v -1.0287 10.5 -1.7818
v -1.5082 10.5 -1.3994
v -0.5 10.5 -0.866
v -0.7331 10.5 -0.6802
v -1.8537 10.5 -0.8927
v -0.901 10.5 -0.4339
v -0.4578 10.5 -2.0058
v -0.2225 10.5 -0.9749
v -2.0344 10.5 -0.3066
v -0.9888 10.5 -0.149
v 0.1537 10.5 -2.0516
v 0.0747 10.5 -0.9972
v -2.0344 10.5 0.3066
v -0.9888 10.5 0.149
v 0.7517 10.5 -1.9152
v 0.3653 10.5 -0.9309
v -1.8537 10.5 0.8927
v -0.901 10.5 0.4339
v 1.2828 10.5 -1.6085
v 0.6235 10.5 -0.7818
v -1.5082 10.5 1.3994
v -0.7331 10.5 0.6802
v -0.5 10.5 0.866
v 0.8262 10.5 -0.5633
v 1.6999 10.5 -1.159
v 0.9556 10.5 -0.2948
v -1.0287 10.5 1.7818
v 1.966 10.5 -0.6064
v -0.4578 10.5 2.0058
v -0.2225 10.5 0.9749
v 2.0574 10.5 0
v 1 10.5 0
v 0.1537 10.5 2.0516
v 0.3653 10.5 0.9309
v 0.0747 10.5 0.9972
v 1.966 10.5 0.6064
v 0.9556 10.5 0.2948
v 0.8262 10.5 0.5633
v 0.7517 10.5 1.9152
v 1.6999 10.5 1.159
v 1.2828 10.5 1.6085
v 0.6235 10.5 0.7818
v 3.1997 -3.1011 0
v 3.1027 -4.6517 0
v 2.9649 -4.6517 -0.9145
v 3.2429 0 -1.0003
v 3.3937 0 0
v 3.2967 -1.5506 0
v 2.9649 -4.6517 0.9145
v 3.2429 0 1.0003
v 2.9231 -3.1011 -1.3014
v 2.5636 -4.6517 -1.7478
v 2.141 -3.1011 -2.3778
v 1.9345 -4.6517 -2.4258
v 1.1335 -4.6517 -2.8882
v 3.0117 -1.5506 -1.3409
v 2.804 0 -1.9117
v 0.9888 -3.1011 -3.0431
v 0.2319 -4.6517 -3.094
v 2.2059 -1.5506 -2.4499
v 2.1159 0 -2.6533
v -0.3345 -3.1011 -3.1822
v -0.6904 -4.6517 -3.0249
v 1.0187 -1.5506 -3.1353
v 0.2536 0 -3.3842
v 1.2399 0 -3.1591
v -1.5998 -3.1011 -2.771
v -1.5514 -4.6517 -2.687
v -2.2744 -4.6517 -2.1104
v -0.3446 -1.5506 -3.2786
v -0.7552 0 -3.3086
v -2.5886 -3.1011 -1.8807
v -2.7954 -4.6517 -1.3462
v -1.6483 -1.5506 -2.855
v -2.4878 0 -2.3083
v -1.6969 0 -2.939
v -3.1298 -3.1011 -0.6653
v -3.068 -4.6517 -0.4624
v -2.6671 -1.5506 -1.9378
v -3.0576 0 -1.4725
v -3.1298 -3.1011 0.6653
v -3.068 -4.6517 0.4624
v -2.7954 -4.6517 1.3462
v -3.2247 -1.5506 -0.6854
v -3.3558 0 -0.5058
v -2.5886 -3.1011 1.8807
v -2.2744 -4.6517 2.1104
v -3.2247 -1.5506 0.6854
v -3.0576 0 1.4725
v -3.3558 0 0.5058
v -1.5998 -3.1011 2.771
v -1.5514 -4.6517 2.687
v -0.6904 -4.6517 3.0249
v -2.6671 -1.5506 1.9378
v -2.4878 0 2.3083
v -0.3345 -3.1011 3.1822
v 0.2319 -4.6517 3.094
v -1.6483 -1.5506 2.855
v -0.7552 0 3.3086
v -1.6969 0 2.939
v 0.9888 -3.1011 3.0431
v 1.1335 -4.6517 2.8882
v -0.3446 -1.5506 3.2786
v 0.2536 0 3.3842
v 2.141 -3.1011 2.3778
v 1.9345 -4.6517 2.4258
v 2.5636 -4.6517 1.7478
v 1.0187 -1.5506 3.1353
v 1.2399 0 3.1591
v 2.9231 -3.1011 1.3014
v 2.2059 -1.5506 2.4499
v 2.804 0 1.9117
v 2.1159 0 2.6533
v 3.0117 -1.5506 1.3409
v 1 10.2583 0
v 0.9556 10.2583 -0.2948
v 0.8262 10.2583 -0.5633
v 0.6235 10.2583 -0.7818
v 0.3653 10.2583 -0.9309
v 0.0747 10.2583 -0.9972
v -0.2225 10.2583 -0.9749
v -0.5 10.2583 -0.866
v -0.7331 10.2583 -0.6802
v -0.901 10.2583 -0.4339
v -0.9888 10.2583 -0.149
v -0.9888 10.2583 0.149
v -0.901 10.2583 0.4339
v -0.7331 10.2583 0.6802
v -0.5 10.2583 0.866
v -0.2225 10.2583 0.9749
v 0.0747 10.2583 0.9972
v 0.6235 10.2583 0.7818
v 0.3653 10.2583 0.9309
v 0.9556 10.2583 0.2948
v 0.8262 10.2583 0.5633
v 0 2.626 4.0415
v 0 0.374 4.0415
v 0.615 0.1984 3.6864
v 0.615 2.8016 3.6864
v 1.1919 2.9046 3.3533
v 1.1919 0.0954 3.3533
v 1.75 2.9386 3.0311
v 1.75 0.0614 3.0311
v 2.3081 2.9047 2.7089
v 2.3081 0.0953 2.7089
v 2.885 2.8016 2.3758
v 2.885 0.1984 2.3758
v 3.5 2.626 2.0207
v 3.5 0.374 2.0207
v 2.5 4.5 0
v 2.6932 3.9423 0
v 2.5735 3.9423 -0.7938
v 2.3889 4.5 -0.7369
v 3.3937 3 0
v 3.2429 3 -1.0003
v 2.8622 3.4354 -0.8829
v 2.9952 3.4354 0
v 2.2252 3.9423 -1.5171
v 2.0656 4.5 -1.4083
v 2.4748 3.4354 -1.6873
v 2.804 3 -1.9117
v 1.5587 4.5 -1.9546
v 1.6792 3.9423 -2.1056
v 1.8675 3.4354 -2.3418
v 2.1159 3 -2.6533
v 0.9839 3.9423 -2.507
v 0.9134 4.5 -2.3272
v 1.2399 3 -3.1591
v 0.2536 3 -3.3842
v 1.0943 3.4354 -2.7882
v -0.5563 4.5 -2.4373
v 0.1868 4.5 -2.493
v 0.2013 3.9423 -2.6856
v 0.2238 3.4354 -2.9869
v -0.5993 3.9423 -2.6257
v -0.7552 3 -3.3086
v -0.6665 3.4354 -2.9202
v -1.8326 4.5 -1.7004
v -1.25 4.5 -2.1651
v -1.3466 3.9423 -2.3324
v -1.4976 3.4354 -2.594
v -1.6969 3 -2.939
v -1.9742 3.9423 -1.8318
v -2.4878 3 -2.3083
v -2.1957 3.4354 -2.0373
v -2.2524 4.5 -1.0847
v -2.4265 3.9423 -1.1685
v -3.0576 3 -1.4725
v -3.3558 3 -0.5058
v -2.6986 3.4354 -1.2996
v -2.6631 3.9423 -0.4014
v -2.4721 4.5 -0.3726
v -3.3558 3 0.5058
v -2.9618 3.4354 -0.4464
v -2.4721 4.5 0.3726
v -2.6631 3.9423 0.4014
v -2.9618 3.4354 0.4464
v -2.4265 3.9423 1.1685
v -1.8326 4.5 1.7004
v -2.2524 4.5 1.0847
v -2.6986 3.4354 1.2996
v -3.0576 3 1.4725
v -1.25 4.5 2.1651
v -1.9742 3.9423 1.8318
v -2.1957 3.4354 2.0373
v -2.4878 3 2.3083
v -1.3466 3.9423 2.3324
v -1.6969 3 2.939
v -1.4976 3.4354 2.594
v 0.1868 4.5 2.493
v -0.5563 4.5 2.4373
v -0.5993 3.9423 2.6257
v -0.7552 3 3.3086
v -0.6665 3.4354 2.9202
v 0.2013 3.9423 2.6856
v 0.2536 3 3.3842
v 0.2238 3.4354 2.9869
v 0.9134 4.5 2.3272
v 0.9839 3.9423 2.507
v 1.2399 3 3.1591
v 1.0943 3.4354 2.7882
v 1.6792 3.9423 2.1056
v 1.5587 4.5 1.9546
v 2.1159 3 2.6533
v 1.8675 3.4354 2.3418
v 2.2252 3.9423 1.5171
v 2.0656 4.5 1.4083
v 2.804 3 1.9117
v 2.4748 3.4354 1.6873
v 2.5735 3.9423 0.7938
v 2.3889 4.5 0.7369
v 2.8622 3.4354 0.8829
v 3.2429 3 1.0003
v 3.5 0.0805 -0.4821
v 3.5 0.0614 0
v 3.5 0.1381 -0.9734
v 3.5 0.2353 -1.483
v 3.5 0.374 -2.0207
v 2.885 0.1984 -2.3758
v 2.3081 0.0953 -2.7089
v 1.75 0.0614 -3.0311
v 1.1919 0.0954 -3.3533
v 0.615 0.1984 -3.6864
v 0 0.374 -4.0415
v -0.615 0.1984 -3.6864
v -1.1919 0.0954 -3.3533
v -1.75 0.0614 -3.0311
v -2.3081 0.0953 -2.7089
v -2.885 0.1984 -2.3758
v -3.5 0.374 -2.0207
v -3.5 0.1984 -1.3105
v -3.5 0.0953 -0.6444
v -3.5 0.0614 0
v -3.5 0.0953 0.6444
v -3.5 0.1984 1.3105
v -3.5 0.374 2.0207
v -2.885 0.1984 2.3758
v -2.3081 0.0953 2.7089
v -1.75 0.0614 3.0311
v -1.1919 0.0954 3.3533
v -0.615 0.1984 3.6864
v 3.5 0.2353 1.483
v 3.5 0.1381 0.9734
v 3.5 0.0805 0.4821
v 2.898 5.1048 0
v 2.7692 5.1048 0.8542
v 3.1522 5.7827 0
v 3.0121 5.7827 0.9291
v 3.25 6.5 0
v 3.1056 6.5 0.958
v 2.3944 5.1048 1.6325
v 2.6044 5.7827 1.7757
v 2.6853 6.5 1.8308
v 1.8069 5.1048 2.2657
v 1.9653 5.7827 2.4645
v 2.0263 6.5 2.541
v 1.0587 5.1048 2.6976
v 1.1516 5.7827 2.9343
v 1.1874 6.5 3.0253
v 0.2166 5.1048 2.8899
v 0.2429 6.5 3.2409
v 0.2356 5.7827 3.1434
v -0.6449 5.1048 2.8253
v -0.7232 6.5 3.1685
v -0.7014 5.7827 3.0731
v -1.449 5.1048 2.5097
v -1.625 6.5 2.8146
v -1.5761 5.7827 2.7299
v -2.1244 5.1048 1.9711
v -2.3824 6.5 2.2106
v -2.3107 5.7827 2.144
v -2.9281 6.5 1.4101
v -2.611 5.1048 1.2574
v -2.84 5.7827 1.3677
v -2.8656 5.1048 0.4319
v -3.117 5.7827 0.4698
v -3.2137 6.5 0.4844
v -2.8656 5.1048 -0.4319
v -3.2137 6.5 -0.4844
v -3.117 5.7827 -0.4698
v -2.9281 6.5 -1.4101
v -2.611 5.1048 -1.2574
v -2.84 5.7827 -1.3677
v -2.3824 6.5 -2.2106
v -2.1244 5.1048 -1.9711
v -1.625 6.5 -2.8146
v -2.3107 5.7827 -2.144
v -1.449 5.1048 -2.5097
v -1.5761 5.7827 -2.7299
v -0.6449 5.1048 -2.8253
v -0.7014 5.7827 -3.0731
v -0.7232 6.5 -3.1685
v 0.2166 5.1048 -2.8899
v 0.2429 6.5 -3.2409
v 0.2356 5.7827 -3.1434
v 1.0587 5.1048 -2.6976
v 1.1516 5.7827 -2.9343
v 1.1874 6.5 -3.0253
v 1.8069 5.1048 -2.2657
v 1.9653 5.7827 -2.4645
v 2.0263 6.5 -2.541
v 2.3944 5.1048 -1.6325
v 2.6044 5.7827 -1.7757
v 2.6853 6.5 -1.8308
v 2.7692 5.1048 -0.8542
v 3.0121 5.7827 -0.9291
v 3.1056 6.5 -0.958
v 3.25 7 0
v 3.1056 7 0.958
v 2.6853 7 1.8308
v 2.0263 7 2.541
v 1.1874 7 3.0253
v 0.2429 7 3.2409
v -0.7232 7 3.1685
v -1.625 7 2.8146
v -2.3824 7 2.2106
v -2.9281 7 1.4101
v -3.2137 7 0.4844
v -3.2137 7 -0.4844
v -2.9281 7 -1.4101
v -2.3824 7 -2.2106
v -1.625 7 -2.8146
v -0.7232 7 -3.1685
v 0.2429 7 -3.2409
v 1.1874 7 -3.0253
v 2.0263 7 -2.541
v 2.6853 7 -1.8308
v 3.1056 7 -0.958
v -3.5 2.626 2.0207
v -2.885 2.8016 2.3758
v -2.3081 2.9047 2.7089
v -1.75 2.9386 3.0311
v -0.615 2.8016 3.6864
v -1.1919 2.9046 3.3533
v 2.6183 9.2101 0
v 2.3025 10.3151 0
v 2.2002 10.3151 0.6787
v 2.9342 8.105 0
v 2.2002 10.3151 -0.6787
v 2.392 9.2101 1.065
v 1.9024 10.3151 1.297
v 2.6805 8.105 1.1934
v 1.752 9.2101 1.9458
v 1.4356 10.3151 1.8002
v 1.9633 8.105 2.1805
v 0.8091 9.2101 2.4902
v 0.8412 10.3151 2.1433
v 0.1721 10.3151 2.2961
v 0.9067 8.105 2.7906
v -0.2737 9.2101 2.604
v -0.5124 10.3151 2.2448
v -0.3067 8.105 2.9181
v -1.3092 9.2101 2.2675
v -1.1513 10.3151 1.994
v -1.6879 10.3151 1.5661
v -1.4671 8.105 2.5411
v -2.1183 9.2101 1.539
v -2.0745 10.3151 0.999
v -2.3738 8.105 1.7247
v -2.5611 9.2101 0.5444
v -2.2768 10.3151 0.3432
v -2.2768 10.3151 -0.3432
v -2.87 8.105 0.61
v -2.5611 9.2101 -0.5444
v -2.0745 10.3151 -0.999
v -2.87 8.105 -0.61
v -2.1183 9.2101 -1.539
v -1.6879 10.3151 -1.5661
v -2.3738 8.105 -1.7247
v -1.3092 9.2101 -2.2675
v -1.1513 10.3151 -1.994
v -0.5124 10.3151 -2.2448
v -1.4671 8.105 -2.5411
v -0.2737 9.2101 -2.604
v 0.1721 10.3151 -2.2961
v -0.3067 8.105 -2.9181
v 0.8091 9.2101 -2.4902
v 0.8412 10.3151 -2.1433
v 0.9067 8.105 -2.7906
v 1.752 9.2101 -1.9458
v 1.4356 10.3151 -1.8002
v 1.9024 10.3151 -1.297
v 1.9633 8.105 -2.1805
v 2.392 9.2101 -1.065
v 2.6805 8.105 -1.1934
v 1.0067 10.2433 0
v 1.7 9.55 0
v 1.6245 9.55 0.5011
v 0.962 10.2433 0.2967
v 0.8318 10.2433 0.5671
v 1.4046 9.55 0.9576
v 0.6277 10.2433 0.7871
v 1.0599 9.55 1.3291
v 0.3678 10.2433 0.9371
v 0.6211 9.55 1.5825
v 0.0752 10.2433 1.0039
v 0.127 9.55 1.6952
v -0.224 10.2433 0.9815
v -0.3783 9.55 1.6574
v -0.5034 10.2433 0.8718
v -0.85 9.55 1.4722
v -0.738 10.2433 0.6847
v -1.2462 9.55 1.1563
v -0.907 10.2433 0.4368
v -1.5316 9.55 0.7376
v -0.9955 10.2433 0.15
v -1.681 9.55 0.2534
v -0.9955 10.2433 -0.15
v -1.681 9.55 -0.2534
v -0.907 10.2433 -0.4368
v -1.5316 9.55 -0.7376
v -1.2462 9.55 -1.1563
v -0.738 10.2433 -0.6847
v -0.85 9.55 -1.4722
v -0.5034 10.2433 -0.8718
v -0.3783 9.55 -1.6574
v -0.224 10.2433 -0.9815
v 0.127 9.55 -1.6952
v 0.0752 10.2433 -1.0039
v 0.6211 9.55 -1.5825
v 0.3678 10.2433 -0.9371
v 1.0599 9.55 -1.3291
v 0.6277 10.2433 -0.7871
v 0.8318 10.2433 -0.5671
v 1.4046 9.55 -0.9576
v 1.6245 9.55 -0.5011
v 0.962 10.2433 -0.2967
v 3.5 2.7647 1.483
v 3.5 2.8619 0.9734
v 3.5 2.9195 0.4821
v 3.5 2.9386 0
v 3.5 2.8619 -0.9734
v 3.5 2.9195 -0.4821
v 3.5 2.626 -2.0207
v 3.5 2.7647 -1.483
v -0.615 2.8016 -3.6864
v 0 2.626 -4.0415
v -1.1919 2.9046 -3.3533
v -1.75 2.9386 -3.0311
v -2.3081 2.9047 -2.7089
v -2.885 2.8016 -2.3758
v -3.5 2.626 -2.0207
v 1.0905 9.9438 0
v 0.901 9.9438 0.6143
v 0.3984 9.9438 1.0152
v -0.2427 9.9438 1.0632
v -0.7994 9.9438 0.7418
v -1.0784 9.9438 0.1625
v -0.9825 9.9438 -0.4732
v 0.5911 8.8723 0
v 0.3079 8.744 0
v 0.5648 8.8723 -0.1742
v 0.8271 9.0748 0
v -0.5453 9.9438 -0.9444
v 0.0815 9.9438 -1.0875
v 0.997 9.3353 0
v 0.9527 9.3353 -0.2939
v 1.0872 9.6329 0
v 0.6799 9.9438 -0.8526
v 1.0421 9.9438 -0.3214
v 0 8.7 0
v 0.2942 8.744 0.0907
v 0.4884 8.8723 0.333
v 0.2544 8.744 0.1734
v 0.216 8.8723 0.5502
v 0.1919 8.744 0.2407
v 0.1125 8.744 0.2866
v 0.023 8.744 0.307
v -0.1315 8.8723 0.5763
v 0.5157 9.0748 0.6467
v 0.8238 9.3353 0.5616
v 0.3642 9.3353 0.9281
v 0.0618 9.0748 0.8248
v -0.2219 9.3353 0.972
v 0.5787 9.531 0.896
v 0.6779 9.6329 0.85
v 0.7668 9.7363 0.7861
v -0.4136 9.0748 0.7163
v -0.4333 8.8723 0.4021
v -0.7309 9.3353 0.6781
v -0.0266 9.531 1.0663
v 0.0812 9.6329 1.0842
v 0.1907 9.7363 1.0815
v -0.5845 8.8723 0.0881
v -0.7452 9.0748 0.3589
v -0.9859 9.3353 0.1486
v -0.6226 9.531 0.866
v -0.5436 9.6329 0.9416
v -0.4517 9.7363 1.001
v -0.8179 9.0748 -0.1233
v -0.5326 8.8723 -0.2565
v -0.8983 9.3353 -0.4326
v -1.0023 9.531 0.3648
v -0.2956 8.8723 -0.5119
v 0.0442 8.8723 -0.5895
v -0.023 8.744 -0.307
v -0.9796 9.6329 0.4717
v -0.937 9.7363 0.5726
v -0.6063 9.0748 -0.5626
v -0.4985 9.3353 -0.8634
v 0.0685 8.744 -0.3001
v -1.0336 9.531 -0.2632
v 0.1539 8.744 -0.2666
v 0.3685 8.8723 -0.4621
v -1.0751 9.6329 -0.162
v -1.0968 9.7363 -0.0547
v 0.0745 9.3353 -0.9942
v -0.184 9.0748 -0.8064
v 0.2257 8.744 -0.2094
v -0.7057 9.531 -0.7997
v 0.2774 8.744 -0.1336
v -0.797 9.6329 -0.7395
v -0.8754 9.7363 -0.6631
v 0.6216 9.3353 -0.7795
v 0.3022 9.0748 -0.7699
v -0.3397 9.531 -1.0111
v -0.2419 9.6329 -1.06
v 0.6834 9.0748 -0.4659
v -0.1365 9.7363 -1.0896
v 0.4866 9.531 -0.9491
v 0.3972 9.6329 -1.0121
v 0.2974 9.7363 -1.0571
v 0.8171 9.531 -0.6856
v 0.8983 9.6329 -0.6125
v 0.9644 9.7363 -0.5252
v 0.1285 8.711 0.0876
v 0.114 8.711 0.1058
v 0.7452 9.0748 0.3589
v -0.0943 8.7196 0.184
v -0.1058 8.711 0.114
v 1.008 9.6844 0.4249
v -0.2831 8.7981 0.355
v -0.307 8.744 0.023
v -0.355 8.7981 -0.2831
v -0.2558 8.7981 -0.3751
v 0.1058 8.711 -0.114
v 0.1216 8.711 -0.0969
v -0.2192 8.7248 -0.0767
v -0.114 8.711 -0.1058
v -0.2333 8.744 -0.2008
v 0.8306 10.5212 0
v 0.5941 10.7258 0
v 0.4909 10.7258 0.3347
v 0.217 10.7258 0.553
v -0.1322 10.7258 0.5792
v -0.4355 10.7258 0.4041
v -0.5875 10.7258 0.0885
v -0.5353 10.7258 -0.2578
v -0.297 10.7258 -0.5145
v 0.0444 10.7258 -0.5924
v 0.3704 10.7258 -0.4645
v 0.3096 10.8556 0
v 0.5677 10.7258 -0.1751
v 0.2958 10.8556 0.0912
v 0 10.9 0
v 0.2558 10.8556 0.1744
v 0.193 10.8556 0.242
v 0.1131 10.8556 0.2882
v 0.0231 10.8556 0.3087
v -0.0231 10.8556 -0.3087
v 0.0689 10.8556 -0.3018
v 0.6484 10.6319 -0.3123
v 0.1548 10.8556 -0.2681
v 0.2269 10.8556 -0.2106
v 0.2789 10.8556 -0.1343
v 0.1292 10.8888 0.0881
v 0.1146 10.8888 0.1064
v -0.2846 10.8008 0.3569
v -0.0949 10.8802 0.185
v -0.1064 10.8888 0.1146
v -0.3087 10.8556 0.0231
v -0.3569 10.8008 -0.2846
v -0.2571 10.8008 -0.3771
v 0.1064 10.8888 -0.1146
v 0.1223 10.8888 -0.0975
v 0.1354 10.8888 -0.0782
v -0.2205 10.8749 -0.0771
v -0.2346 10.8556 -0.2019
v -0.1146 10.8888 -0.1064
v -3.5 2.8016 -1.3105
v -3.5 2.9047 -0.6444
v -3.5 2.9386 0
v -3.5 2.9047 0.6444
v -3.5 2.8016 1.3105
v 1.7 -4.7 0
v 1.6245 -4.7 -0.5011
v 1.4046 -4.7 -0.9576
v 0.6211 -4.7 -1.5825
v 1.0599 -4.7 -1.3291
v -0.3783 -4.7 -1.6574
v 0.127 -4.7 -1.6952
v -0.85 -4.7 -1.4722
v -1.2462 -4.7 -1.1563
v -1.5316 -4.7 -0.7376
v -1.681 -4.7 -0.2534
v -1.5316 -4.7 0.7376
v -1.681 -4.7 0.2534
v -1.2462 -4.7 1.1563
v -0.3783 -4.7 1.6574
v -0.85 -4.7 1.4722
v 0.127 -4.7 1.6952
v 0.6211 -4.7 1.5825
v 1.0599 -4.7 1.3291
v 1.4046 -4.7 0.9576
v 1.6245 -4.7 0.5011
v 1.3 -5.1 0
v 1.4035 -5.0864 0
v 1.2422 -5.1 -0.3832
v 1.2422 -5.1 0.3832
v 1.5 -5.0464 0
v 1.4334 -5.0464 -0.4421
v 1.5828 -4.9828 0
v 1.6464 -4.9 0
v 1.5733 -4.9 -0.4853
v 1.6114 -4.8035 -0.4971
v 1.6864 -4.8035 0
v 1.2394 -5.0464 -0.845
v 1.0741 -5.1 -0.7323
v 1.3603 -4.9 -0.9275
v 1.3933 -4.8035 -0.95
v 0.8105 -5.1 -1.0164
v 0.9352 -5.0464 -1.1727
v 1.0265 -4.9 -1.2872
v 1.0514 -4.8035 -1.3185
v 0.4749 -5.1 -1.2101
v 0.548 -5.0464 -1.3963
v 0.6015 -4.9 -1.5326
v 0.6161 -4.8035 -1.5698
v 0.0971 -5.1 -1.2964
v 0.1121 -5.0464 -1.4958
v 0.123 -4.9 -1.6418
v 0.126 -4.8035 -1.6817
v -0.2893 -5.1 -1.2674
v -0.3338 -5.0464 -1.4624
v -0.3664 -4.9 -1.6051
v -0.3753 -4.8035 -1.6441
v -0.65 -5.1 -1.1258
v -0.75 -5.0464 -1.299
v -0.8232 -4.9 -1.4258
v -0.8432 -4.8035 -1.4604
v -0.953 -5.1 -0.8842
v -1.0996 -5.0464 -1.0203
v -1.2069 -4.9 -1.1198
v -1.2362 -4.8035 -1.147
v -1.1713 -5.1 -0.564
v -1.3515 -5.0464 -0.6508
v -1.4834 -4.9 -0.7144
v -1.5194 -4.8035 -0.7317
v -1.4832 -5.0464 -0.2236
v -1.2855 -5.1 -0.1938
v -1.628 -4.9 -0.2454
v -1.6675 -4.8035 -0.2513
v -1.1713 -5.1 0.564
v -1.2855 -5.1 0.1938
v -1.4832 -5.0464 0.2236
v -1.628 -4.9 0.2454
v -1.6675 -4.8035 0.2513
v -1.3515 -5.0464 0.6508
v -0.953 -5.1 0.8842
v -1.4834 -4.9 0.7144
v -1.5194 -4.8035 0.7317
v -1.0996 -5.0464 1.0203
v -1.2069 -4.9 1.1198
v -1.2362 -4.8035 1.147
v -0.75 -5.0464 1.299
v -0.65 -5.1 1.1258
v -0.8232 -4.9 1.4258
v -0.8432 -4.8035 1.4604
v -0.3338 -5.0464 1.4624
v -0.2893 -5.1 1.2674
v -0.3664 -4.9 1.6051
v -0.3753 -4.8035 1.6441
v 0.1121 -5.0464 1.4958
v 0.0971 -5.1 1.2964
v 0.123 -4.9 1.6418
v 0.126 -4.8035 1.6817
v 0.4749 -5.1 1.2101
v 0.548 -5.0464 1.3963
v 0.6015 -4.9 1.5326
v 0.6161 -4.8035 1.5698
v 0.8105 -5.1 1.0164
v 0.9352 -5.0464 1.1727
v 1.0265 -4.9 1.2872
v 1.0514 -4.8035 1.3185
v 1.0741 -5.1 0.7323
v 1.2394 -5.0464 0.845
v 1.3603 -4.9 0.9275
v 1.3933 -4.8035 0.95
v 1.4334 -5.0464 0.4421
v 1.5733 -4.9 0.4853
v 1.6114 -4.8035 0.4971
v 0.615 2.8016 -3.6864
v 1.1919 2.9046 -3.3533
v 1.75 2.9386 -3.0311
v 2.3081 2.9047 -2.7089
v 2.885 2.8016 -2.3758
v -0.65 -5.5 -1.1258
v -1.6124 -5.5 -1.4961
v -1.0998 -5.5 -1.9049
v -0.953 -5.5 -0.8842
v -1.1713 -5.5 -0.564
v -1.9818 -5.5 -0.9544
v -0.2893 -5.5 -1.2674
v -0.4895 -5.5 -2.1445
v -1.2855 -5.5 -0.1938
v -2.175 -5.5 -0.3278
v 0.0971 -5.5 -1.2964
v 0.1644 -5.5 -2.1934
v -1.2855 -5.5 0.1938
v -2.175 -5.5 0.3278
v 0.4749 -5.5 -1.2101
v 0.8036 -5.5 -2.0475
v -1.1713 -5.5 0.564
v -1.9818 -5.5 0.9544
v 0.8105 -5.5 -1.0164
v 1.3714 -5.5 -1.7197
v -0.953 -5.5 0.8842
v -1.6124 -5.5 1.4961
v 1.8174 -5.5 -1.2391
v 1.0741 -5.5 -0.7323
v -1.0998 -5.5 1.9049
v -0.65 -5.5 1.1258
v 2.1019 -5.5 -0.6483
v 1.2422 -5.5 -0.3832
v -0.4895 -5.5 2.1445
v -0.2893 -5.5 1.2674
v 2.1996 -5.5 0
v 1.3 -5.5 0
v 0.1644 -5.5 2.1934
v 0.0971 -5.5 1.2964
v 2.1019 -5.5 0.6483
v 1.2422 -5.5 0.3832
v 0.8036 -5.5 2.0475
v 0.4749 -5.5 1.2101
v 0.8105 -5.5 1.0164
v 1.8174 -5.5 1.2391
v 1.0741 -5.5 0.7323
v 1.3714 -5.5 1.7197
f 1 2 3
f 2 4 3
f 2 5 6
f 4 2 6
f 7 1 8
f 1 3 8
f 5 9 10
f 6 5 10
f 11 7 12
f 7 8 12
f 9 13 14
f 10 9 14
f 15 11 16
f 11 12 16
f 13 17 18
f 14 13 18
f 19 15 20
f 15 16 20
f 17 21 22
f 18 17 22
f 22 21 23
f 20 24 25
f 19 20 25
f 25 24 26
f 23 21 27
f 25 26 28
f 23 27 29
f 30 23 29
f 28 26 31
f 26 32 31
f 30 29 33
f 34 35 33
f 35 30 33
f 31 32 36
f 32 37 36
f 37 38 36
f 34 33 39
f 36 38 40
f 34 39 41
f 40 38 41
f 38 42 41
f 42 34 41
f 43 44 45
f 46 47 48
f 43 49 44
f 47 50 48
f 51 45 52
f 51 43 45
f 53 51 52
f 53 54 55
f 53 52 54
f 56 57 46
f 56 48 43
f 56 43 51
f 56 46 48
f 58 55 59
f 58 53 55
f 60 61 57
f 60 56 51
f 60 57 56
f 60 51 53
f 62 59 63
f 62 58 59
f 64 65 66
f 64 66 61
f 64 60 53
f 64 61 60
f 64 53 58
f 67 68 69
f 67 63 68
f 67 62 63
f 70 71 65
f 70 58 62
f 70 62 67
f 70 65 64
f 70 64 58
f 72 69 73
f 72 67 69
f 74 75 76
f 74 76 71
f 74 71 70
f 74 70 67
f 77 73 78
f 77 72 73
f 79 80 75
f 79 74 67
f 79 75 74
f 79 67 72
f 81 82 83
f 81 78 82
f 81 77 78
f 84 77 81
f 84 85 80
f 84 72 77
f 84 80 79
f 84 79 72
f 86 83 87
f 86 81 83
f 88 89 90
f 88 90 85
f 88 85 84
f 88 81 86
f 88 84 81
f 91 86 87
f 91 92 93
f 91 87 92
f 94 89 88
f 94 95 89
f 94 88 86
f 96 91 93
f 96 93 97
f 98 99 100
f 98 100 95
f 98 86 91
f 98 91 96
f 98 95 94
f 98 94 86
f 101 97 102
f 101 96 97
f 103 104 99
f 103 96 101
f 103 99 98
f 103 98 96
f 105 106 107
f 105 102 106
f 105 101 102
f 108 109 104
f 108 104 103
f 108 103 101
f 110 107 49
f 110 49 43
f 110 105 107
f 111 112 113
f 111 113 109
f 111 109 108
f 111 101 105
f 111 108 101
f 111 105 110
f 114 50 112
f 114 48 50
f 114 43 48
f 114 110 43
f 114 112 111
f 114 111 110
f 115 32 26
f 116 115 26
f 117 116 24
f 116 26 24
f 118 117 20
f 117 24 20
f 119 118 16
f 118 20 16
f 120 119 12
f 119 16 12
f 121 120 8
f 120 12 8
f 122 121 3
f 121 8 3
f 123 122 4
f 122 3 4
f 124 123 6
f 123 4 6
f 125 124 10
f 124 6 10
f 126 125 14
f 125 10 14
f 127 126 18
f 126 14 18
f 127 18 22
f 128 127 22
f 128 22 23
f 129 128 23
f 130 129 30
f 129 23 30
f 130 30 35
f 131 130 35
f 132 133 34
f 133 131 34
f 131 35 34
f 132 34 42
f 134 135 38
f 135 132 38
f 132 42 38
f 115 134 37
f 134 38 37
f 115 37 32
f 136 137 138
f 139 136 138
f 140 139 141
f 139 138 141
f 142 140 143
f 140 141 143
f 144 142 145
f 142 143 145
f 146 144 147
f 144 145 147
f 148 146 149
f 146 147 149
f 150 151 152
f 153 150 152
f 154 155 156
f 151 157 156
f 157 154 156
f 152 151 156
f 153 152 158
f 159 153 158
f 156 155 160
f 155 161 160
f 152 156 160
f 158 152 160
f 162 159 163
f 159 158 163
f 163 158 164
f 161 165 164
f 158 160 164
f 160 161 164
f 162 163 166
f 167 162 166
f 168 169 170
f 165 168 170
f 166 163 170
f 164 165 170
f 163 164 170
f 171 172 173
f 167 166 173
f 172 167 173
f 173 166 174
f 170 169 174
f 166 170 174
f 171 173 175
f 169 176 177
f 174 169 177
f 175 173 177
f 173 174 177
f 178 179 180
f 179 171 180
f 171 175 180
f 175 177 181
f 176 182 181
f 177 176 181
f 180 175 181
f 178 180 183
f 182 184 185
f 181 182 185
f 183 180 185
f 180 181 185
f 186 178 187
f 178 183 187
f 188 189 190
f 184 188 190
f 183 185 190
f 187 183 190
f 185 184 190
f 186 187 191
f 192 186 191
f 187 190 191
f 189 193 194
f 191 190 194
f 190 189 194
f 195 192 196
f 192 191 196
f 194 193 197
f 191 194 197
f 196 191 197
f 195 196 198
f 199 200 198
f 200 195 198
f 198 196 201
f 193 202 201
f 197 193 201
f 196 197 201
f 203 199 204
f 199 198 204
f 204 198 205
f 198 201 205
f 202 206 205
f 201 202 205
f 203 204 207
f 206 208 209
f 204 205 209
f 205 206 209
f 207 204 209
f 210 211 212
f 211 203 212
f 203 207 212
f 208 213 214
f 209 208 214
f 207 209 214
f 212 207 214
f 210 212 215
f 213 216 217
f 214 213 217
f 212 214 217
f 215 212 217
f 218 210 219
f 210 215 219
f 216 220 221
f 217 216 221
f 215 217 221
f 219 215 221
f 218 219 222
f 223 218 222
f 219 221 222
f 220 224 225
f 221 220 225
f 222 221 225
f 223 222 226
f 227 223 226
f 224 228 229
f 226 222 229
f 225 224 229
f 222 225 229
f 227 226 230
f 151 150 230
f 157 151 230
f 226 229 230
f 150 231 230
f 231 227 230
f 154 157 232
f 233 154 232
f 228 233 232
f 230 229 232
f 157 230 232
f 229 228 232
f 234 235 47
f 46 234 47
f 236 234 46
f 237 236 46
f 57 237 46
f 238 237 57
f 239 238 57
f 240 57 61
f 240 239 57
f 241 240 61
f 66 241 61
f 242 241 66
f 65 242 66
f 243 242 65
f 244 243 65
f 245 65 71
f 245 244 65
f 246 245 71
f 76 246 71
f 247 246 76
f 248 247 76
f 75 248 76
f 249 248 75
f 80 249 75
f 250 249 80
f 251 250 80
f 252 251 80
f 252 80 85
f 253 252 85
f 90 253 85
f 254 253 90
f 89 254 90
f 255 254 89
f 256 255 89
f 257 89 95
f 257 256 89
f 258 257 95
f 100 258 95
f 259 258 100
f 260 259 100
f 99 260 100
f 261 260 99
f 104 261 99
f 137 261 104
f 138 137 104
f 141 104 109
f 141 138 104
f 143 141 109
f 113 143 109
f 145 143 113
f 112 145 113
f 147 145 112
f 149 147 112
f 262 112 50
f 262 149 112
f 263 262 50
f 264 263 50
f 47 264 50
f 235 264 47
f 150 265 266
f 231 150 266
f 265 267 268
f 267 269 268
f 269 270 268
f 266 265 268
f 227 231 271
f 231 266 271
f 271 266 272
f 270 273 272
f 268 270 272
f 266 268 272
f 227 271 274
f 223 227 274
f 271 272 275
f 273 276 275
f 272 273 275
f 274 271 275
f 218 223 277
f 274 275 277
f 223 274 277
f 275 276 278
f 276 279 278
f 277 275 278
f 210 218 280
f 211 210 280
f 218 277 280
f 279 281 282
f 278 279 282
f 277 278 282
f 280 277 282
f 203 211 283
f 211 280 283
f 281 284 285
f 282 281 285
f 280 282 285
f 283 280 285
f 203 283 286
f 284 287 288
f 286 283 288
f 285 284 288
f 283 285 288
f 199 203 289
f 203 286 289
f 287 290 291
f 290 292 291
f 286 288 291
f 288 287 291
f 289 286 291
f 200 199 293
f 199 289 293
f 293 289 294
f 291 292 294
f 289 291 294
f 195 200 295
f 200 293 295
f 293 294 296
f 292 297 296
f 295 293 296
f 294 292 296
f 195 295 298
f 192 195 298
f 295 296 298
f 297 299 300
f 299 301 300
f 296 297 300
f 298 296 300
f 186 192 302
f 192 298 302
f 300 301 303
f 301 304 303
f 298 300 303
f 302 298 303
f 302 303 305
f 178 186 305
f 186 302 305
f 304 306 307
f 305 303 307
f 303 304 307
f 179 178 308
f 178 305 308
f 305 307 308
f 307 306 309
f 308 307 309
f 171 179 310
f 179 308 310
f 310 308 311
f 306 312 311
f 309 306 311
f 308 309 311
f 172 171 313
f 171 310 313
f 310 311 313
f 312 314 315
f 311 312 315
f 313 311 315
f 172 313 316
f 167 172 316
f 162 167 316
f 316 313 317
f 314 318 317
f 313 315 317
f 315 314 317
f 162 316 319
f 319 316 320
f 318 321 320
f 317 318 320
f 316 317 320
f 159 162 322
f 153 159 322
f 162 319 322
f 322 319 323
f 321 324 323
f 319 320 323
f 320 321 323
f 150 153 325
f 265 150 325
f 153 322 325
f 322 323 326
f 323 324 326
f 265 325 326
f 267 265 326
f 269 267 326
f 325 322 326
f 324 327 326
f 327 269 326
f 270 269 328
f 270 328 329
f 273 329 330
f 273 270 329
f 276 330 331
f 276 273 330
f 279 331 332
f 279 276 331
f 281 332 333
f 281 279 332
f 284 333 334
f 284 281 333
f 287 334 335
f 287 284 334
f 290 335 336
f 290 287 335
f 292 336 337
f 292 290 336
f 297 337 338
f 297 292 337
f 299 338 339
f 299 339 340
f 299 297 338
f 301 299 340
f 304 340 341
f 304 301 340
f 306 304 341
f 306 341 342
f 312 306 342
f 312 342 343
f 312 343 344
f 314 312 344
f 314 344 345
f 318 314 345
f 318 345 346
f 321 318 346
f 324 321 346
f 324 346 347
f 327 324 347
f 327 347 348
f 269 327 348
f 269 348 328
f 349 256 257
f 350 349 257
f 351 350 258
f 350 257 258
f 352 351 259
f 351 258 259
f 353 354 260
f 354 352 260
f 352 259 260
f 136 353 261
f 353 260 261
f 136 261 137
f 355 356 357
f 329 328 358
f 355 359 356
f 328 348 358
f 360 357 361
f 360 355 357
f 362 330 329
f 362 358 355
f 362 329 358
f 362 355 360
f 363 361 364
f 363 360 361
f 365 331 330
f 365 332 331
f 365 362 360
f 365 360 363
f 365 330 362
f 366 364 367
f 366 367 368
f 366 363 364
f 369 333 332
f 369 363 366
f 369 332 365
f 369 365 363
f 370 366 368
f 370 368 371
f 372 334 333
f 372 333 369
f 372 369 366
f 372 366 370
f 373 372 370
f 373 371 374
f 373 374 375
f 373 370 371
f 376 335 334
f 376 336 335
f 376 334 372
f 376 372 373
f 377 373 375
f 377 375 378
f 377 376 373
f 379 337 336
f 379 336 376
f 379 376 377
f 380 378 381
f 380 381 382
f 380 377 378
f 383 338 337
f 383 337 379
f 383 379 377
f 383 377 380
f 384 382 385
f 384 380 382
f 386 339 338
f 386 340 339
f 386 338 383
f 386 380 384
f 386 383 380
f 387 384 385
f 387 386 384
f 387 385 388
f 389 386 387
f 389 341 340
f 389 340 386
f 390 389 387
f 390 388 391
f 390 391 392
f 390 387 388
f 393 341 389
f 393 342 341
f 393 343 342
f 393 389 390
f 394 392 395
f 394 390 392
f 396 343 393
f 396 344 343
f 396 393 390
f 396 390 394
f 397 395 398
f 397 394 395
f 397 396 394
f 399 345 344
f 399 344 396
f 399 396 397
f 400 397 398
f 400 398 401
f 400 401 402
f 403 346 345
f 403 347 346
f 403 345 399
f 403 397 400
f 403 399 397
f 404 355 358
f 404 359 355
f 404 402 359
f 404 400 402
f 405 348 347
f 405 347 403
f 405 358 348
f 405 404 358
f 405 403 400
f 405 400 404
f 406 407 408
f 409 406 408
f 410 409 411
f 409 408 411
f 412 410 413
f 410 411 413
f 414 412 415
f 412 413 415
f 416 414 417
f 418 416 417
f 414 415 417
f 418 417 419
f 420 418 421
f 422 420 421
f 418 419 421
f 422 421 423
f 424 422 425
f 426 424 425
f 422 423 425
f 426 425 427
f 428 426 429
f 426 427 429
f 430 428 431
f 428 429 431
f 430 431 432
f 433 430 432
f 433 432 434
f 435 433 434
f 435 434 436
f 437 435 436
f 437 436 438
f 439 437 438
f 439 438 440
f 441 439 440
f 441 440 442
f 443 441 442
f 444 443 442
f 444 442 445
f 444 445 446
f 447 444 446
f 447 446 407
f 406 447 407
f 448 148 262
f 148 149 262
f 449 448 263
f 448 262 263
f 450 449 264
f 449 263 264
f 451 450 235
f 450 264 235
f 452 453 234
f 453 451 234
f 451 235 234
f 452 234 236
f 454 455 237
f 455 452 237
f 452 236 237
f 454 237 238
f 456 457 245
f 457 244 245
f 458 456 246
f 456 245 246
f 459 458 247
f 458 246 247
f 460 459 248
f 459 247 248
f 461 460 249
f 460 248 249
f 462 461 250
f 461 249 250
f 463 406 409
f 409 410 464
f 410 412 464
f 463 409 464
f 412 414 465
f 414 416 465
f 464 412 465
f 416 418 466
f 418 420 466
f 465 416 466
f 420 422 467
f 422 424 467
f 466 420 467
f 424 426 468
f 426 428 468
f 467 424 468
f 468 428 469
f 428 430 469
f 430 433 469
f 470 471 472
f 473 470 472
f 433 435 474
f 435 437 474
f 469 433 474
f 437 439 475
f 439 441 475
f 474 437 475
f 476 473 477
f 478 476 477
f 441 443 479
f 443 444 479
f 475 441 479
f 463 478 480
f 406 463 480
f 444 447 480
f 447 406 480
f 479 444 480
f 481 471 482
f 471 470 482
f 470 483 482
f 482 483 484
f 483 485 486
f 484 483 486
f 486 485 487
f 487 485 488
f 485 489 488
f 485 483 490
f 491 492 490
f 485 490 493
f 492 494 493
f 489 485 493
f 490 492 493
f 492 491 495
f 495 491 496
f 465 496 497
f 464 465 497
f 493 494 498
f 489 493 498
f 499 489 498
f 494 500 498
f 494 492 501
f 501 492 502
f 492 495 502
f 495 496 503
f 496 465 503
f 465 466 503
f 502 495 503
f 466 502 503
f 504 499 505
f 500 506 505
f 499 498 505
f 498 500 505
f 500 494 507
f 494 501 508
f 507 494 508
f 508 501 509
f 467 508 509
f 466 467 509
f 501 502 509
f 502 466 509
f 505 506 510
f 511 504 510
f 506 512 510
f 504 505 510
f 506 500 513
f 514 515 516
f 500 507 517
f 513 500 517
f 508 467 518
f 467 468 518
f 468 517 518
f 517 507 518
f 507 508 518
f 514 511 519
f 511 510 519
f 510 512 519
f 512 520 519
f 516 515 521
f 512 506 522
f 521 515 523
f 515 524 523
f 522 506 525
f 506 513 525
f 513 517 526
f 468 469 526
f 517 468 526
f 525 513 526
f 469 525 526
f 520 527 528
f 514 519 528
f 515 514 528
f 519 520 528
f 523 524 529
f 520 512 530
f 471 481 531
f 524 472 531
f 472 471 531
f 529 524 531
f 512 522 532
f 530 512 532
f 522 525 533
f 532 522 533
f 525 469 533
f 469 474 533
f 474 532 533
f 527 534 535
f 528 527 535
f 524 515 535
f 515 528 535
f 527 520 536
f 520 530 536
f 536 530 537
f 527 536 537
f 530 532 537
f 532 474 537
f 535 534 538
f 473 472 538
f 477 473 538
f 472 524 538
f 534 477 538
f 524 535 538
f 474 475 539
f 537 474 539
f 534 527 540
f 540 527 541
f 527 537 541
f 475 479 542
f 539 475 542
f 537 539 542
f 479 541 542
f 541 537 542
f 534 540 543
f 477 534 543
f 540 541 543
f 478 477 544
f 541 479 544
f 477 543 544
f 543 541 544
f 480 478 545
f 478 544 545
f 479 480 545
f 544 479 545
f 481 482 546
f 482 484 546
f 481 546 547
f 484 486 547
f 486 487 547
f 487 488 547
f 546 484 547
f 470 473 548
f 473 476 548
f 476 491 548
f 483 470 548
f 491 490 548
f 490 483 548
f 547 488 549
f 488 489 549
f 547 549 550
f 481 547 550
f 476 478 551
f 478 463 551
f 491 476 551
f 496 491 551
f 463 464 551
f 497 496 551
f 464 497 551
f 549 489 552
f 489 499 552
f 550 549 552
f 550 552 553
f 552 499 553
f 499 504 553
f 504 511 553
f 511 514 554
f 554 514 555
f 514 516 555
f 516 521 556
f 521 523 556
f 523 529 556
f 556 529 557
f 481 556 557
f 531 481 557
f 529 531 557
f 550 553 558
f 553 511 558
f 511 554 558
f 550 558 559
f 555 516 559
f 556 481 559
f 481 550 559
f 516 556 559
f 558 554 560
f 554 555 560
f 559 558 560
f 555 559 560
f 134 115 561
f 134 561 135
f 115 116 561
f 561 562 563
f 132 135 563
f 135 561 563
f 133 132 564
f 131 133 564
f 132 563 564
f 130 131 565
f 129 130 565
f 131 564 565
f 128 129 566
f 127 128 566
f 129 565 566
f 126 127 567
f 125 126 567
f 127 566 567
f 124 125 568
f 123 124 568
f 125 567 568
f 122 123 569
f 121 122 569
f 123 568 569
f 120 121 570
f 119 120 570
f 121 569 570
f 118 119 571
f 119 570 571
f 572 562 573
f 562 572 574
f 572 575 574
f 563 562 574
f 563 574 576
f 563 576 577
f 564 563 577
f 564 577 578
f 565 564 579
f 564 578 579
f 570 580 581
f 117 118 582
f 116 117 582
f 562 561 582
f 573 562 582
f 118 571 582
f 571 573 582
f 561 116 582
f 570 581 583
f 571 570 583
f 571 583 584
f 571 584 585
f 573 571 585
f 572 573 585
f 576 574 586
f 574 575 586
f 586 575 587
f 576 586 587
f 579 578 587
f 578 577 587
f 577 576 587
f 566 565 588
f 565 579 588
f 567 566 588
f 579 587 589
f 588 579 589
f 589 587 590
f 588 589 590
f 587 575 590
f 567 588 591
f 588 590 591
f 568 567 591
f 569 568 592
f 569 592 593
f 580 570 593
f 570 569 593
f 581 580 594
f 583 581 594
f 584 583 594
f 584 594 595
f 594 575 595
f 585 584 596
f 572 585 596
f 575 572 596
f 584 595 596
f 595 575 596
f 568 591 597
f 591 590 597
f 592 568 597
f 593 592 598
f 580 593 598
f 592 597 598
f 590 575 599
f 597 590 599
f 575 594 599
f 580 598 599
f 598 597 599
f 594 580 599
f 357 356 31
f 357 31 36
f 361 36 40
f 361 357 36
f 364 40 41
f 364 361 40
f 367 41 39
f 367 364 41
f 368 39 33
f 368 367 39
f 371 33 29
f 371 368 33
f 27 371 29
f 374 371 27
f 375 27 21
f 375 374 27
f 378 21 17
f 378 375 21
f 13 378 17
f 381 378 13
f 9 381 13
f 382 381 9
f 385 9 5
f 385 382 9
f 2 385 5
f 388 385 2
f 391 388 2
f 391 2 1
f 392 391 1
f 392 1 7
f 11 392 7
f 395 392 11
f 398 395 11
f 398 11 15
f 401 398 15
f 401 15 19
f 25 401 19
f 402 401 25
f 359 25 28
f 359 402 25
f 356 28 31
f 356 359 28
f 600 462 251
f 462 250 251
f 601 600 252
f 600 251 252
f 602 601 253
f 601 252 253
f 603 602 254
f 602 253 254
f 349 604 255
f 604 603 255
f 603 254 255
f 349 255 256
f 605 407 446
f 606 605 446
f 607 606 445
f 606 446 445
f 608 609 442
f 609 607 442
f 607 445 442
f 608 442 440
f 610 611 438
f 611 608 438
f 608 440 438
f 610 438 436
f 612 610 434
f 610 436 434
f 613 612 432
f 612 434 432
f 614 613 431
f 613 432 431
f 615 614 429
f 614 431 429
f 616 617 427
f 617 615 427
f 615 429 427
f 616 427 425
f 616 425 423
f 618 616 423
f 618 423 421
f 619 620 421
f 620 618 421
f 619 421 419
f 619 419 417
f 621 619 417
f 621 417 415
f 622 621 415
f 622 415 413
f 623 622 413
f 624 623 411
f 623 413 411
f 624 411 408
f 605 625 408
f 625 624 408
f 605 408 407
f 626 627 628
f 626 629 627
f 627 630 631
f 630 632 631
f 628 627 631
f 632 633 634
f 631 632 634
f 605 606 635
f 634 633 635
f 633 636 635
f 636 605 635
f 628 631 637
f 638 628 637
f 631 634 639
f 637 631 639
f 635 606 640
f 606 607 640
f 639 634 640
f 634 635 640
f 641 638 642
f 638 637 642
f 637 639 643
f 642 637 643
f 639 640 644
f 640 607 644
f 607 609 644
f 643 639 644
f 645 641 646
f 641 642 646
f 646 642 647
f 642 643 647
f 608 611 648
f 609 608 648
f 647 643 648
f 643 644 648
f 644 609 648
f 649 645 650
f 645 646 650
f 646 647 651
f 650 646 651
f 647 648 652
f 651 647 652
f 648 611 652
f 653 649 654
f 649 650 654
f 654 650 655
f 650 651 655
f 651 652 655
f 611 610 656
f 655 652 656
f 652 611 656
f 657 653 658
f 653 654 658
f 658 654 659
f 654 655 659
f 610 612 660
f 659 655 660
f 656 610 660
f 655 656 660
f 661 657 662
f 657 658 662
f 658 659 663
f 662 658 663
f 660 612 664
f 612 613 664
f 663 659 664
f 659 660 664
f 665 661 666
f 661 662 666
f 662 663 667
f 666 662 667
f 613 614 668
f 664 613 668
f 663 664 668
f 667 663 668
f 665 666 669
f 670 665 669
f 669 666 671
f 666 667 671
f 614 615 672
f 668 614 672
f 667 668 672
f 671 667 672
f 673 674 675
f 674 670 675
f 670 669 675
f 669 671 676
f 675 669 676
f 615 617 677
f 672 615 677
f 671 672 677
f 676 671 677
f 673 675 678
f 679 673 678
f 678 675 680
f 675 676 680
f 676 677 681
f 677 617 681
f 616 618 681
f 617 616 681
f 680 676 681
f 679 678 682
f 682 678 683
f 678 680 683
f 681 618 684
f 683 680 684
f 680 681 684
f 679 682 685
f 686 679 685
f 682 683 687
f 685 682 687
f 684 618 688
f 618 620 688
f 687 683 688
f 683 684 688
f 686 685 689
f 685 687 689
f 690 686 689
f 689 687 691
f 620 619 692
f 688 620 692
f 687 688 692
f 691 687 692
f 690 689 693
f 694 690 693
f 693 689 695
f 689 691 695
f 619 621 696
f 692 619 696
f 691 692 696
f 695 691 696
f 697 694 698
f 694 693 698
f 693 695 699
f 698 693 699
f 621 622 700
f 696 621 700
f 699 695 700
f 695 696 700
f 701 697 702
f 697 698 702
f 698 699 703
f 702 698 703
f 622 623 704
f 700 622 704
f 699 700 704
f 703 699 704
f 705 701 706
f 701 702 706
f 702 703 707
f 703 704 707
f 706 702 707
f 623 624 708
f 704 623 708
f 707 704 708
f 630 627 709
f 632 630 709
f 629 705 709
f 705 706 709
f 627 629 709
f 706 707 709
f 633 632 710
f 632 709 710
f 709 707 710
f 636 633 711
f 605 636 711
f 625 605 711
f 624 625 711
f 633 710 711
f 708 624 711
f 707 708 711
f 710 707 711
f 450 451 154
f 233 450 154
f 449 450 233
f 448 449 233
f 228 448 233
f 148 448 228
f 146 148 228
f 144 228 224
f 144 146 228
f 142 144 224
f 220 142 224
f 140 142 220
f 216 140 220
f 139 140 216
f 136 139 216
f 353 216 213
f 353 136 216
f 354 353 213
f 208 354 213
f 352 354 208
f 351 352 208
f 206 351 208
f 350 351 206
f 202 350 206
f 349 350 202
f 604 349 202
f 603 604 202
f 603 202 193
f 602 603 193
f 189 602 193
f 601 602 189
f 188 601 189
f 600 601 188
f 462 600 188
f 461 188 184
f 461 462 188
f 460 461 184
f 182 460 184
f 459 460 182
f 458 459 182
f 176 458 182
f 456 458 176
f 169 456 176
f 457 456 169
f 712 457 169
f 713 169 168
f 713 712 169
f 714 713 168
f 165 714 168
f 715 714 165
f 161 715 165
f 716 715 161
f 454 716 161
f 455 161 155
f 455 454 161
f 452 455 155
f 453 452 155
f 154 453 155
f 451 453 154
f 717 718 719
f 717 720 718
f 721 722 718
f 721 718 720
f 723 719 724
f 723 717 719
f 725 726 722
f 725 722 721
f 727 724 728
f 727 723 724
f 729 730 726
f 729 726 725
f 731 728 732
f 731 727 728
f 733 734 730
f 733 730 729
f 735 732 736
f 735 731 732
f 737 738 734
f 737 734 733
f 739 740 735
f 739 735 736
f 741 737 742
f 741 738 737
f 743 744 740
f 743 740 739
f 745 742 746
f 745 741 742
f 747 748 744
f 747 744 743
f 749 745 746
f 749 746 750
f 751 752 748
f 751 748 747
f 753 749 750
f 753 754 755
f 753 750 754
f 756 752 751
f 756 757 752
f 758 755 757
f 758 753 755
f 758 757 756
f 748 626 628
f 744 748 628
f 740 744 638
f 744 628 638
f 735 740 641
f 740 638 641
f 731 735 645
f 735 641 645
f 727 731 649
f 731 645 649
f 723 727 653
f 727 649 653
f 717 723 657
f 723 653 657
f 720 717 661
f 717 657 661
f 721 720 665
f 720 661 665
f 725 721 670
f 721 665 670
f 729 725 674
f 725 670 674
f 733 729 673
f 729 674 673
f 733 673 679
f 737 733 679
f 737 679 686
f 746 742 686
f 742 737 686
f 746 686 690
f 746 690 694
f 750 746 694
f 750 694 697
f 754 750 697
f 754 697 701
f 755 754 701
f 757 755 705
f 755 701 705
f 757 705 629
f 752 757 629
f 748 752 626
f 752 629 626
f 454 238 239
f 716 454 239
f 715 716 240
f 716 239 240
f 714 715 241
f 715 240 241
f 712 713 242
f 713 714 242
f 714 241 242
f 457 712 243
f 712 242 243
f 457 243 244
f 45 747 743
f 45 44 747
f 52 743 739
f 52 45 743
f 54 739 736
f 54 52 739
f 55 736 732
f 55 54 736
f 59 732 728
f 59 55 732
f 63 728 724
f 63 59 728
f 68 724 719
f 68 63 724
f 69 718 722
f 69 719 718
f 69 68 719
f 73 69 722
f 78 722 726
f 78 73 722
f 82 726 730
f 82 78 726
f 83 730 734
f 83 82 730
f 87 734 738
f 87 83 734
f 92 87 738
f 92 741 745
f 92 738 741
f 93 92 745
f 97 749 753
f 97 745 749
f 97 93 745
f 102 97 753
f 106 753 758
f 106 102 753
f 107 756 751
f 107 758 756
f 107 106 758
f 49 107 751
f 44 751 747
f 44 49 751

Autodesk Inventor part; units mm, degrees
sketch "Sketch_1" plane through (0, 0, 0) normal (0, 0, 1) x (1, 0, 0)
  line L0 (0, -5.5) -> (0, 10.5)
  arc A0 (1, 10.2583) -> (0, 10.9) centre (0, 9.8) ccw
  line L1 (1, 10.2583) -> (1, 10.5)
  line L2 (1, 10.5) -> (2.0574, 10.5)
  line L3 (2.0574, 10.5) -> (2.3025, 10.3151)
  line L4 (2.3025, 10.3151) -> (3.25, 7)
  line L5 (3.25, 7) -> (3.25, 6.5)
  arc A1 (2.5, 4.5) -> (3.25, 6.5) centre (0.0009, 6.5778) ccw
  arc A2 (2.5, 4.5) -> (3.3937, 3) centre (5.3226, 5.1655) ccw
  line L6 (3.3937, 3) -> (5.5, 1.7839)
  line L7 (5.5, 1.7839) -> (5.5, 1.2161)
  line L8 (5.5, 1.2161) -> (3.3937, 0)
  line L9 (3.3937, 0) -> (3.1027, -4.6517)
  line L10 (3.1027, -4.6517) -> (2.1996, -5.5)
  line L11 (2.1996, -5.5) -> (1.3, -5.5)
  line L12 (1.3, -5.5) -> (1.3, -5.1)
  arc A3 (1.3, -5.1) -> (1.7, -4.7) centre (1.3, -4.7) ccw
  line L13 (1.7, -4.7) -> (1.7, 9.55)
  line L14 (1.7, 9.55) -> (1.0067, 10.2433)
  arc A4 (0, 8.7) -> (1.0067, 10.2433) centre (0, 9.8) ccw
  line L15 (0, 8.7) -> (0, 10.9)
revolve "Revolution1" add sketch "Sketch_1" angle 360 about axis through (0, -5.5, 0) along (0, -1, 0)
sketch "Sketch_2" plane through (0, 0, 0) normal (0, 1, 0) x (-1, 0, 0)
  line L0 (6, -6) -> (6, 6)
  line L1 (6, 6) -> (-6, 6)
  line L2 (-6, 6) -> (-6, -6)
  line L3 (-6, -6) -> (6, -6)
  line L4 (3.5, 2.0207) -> (0, 4.0415)
  line L5 (0, 4.0415) -> (-3.5, 2.0207)
  line L6 (-3.5, 2.0207) -> (-3.5, -2.0207)
  line L7 (-3.5, -2.0207) -> (0, -4.0415)
  line L8 (0, -4.0415) -> (3.5, -2.0207)
  line L9 (3.5, -2.0207) -> (3.5, 2.0207)
extrude "Extrusion1" cut sketch "Sketch_2" along normal blind 3
ref_plane "gn_XY" through (0, 0, 0) normal (0, 0, 1) x (1, 0, 0)
ref_plane "gn_YZ" through (0, 0, 0) normal (1, 0, 0) x (0, 1, 0)
ref_plane "gn_ZX" through (0, 0, 0) normal (0, 1, 0) x (0, 0, 1)
properties part number "1/4-28 SAE-LT"
